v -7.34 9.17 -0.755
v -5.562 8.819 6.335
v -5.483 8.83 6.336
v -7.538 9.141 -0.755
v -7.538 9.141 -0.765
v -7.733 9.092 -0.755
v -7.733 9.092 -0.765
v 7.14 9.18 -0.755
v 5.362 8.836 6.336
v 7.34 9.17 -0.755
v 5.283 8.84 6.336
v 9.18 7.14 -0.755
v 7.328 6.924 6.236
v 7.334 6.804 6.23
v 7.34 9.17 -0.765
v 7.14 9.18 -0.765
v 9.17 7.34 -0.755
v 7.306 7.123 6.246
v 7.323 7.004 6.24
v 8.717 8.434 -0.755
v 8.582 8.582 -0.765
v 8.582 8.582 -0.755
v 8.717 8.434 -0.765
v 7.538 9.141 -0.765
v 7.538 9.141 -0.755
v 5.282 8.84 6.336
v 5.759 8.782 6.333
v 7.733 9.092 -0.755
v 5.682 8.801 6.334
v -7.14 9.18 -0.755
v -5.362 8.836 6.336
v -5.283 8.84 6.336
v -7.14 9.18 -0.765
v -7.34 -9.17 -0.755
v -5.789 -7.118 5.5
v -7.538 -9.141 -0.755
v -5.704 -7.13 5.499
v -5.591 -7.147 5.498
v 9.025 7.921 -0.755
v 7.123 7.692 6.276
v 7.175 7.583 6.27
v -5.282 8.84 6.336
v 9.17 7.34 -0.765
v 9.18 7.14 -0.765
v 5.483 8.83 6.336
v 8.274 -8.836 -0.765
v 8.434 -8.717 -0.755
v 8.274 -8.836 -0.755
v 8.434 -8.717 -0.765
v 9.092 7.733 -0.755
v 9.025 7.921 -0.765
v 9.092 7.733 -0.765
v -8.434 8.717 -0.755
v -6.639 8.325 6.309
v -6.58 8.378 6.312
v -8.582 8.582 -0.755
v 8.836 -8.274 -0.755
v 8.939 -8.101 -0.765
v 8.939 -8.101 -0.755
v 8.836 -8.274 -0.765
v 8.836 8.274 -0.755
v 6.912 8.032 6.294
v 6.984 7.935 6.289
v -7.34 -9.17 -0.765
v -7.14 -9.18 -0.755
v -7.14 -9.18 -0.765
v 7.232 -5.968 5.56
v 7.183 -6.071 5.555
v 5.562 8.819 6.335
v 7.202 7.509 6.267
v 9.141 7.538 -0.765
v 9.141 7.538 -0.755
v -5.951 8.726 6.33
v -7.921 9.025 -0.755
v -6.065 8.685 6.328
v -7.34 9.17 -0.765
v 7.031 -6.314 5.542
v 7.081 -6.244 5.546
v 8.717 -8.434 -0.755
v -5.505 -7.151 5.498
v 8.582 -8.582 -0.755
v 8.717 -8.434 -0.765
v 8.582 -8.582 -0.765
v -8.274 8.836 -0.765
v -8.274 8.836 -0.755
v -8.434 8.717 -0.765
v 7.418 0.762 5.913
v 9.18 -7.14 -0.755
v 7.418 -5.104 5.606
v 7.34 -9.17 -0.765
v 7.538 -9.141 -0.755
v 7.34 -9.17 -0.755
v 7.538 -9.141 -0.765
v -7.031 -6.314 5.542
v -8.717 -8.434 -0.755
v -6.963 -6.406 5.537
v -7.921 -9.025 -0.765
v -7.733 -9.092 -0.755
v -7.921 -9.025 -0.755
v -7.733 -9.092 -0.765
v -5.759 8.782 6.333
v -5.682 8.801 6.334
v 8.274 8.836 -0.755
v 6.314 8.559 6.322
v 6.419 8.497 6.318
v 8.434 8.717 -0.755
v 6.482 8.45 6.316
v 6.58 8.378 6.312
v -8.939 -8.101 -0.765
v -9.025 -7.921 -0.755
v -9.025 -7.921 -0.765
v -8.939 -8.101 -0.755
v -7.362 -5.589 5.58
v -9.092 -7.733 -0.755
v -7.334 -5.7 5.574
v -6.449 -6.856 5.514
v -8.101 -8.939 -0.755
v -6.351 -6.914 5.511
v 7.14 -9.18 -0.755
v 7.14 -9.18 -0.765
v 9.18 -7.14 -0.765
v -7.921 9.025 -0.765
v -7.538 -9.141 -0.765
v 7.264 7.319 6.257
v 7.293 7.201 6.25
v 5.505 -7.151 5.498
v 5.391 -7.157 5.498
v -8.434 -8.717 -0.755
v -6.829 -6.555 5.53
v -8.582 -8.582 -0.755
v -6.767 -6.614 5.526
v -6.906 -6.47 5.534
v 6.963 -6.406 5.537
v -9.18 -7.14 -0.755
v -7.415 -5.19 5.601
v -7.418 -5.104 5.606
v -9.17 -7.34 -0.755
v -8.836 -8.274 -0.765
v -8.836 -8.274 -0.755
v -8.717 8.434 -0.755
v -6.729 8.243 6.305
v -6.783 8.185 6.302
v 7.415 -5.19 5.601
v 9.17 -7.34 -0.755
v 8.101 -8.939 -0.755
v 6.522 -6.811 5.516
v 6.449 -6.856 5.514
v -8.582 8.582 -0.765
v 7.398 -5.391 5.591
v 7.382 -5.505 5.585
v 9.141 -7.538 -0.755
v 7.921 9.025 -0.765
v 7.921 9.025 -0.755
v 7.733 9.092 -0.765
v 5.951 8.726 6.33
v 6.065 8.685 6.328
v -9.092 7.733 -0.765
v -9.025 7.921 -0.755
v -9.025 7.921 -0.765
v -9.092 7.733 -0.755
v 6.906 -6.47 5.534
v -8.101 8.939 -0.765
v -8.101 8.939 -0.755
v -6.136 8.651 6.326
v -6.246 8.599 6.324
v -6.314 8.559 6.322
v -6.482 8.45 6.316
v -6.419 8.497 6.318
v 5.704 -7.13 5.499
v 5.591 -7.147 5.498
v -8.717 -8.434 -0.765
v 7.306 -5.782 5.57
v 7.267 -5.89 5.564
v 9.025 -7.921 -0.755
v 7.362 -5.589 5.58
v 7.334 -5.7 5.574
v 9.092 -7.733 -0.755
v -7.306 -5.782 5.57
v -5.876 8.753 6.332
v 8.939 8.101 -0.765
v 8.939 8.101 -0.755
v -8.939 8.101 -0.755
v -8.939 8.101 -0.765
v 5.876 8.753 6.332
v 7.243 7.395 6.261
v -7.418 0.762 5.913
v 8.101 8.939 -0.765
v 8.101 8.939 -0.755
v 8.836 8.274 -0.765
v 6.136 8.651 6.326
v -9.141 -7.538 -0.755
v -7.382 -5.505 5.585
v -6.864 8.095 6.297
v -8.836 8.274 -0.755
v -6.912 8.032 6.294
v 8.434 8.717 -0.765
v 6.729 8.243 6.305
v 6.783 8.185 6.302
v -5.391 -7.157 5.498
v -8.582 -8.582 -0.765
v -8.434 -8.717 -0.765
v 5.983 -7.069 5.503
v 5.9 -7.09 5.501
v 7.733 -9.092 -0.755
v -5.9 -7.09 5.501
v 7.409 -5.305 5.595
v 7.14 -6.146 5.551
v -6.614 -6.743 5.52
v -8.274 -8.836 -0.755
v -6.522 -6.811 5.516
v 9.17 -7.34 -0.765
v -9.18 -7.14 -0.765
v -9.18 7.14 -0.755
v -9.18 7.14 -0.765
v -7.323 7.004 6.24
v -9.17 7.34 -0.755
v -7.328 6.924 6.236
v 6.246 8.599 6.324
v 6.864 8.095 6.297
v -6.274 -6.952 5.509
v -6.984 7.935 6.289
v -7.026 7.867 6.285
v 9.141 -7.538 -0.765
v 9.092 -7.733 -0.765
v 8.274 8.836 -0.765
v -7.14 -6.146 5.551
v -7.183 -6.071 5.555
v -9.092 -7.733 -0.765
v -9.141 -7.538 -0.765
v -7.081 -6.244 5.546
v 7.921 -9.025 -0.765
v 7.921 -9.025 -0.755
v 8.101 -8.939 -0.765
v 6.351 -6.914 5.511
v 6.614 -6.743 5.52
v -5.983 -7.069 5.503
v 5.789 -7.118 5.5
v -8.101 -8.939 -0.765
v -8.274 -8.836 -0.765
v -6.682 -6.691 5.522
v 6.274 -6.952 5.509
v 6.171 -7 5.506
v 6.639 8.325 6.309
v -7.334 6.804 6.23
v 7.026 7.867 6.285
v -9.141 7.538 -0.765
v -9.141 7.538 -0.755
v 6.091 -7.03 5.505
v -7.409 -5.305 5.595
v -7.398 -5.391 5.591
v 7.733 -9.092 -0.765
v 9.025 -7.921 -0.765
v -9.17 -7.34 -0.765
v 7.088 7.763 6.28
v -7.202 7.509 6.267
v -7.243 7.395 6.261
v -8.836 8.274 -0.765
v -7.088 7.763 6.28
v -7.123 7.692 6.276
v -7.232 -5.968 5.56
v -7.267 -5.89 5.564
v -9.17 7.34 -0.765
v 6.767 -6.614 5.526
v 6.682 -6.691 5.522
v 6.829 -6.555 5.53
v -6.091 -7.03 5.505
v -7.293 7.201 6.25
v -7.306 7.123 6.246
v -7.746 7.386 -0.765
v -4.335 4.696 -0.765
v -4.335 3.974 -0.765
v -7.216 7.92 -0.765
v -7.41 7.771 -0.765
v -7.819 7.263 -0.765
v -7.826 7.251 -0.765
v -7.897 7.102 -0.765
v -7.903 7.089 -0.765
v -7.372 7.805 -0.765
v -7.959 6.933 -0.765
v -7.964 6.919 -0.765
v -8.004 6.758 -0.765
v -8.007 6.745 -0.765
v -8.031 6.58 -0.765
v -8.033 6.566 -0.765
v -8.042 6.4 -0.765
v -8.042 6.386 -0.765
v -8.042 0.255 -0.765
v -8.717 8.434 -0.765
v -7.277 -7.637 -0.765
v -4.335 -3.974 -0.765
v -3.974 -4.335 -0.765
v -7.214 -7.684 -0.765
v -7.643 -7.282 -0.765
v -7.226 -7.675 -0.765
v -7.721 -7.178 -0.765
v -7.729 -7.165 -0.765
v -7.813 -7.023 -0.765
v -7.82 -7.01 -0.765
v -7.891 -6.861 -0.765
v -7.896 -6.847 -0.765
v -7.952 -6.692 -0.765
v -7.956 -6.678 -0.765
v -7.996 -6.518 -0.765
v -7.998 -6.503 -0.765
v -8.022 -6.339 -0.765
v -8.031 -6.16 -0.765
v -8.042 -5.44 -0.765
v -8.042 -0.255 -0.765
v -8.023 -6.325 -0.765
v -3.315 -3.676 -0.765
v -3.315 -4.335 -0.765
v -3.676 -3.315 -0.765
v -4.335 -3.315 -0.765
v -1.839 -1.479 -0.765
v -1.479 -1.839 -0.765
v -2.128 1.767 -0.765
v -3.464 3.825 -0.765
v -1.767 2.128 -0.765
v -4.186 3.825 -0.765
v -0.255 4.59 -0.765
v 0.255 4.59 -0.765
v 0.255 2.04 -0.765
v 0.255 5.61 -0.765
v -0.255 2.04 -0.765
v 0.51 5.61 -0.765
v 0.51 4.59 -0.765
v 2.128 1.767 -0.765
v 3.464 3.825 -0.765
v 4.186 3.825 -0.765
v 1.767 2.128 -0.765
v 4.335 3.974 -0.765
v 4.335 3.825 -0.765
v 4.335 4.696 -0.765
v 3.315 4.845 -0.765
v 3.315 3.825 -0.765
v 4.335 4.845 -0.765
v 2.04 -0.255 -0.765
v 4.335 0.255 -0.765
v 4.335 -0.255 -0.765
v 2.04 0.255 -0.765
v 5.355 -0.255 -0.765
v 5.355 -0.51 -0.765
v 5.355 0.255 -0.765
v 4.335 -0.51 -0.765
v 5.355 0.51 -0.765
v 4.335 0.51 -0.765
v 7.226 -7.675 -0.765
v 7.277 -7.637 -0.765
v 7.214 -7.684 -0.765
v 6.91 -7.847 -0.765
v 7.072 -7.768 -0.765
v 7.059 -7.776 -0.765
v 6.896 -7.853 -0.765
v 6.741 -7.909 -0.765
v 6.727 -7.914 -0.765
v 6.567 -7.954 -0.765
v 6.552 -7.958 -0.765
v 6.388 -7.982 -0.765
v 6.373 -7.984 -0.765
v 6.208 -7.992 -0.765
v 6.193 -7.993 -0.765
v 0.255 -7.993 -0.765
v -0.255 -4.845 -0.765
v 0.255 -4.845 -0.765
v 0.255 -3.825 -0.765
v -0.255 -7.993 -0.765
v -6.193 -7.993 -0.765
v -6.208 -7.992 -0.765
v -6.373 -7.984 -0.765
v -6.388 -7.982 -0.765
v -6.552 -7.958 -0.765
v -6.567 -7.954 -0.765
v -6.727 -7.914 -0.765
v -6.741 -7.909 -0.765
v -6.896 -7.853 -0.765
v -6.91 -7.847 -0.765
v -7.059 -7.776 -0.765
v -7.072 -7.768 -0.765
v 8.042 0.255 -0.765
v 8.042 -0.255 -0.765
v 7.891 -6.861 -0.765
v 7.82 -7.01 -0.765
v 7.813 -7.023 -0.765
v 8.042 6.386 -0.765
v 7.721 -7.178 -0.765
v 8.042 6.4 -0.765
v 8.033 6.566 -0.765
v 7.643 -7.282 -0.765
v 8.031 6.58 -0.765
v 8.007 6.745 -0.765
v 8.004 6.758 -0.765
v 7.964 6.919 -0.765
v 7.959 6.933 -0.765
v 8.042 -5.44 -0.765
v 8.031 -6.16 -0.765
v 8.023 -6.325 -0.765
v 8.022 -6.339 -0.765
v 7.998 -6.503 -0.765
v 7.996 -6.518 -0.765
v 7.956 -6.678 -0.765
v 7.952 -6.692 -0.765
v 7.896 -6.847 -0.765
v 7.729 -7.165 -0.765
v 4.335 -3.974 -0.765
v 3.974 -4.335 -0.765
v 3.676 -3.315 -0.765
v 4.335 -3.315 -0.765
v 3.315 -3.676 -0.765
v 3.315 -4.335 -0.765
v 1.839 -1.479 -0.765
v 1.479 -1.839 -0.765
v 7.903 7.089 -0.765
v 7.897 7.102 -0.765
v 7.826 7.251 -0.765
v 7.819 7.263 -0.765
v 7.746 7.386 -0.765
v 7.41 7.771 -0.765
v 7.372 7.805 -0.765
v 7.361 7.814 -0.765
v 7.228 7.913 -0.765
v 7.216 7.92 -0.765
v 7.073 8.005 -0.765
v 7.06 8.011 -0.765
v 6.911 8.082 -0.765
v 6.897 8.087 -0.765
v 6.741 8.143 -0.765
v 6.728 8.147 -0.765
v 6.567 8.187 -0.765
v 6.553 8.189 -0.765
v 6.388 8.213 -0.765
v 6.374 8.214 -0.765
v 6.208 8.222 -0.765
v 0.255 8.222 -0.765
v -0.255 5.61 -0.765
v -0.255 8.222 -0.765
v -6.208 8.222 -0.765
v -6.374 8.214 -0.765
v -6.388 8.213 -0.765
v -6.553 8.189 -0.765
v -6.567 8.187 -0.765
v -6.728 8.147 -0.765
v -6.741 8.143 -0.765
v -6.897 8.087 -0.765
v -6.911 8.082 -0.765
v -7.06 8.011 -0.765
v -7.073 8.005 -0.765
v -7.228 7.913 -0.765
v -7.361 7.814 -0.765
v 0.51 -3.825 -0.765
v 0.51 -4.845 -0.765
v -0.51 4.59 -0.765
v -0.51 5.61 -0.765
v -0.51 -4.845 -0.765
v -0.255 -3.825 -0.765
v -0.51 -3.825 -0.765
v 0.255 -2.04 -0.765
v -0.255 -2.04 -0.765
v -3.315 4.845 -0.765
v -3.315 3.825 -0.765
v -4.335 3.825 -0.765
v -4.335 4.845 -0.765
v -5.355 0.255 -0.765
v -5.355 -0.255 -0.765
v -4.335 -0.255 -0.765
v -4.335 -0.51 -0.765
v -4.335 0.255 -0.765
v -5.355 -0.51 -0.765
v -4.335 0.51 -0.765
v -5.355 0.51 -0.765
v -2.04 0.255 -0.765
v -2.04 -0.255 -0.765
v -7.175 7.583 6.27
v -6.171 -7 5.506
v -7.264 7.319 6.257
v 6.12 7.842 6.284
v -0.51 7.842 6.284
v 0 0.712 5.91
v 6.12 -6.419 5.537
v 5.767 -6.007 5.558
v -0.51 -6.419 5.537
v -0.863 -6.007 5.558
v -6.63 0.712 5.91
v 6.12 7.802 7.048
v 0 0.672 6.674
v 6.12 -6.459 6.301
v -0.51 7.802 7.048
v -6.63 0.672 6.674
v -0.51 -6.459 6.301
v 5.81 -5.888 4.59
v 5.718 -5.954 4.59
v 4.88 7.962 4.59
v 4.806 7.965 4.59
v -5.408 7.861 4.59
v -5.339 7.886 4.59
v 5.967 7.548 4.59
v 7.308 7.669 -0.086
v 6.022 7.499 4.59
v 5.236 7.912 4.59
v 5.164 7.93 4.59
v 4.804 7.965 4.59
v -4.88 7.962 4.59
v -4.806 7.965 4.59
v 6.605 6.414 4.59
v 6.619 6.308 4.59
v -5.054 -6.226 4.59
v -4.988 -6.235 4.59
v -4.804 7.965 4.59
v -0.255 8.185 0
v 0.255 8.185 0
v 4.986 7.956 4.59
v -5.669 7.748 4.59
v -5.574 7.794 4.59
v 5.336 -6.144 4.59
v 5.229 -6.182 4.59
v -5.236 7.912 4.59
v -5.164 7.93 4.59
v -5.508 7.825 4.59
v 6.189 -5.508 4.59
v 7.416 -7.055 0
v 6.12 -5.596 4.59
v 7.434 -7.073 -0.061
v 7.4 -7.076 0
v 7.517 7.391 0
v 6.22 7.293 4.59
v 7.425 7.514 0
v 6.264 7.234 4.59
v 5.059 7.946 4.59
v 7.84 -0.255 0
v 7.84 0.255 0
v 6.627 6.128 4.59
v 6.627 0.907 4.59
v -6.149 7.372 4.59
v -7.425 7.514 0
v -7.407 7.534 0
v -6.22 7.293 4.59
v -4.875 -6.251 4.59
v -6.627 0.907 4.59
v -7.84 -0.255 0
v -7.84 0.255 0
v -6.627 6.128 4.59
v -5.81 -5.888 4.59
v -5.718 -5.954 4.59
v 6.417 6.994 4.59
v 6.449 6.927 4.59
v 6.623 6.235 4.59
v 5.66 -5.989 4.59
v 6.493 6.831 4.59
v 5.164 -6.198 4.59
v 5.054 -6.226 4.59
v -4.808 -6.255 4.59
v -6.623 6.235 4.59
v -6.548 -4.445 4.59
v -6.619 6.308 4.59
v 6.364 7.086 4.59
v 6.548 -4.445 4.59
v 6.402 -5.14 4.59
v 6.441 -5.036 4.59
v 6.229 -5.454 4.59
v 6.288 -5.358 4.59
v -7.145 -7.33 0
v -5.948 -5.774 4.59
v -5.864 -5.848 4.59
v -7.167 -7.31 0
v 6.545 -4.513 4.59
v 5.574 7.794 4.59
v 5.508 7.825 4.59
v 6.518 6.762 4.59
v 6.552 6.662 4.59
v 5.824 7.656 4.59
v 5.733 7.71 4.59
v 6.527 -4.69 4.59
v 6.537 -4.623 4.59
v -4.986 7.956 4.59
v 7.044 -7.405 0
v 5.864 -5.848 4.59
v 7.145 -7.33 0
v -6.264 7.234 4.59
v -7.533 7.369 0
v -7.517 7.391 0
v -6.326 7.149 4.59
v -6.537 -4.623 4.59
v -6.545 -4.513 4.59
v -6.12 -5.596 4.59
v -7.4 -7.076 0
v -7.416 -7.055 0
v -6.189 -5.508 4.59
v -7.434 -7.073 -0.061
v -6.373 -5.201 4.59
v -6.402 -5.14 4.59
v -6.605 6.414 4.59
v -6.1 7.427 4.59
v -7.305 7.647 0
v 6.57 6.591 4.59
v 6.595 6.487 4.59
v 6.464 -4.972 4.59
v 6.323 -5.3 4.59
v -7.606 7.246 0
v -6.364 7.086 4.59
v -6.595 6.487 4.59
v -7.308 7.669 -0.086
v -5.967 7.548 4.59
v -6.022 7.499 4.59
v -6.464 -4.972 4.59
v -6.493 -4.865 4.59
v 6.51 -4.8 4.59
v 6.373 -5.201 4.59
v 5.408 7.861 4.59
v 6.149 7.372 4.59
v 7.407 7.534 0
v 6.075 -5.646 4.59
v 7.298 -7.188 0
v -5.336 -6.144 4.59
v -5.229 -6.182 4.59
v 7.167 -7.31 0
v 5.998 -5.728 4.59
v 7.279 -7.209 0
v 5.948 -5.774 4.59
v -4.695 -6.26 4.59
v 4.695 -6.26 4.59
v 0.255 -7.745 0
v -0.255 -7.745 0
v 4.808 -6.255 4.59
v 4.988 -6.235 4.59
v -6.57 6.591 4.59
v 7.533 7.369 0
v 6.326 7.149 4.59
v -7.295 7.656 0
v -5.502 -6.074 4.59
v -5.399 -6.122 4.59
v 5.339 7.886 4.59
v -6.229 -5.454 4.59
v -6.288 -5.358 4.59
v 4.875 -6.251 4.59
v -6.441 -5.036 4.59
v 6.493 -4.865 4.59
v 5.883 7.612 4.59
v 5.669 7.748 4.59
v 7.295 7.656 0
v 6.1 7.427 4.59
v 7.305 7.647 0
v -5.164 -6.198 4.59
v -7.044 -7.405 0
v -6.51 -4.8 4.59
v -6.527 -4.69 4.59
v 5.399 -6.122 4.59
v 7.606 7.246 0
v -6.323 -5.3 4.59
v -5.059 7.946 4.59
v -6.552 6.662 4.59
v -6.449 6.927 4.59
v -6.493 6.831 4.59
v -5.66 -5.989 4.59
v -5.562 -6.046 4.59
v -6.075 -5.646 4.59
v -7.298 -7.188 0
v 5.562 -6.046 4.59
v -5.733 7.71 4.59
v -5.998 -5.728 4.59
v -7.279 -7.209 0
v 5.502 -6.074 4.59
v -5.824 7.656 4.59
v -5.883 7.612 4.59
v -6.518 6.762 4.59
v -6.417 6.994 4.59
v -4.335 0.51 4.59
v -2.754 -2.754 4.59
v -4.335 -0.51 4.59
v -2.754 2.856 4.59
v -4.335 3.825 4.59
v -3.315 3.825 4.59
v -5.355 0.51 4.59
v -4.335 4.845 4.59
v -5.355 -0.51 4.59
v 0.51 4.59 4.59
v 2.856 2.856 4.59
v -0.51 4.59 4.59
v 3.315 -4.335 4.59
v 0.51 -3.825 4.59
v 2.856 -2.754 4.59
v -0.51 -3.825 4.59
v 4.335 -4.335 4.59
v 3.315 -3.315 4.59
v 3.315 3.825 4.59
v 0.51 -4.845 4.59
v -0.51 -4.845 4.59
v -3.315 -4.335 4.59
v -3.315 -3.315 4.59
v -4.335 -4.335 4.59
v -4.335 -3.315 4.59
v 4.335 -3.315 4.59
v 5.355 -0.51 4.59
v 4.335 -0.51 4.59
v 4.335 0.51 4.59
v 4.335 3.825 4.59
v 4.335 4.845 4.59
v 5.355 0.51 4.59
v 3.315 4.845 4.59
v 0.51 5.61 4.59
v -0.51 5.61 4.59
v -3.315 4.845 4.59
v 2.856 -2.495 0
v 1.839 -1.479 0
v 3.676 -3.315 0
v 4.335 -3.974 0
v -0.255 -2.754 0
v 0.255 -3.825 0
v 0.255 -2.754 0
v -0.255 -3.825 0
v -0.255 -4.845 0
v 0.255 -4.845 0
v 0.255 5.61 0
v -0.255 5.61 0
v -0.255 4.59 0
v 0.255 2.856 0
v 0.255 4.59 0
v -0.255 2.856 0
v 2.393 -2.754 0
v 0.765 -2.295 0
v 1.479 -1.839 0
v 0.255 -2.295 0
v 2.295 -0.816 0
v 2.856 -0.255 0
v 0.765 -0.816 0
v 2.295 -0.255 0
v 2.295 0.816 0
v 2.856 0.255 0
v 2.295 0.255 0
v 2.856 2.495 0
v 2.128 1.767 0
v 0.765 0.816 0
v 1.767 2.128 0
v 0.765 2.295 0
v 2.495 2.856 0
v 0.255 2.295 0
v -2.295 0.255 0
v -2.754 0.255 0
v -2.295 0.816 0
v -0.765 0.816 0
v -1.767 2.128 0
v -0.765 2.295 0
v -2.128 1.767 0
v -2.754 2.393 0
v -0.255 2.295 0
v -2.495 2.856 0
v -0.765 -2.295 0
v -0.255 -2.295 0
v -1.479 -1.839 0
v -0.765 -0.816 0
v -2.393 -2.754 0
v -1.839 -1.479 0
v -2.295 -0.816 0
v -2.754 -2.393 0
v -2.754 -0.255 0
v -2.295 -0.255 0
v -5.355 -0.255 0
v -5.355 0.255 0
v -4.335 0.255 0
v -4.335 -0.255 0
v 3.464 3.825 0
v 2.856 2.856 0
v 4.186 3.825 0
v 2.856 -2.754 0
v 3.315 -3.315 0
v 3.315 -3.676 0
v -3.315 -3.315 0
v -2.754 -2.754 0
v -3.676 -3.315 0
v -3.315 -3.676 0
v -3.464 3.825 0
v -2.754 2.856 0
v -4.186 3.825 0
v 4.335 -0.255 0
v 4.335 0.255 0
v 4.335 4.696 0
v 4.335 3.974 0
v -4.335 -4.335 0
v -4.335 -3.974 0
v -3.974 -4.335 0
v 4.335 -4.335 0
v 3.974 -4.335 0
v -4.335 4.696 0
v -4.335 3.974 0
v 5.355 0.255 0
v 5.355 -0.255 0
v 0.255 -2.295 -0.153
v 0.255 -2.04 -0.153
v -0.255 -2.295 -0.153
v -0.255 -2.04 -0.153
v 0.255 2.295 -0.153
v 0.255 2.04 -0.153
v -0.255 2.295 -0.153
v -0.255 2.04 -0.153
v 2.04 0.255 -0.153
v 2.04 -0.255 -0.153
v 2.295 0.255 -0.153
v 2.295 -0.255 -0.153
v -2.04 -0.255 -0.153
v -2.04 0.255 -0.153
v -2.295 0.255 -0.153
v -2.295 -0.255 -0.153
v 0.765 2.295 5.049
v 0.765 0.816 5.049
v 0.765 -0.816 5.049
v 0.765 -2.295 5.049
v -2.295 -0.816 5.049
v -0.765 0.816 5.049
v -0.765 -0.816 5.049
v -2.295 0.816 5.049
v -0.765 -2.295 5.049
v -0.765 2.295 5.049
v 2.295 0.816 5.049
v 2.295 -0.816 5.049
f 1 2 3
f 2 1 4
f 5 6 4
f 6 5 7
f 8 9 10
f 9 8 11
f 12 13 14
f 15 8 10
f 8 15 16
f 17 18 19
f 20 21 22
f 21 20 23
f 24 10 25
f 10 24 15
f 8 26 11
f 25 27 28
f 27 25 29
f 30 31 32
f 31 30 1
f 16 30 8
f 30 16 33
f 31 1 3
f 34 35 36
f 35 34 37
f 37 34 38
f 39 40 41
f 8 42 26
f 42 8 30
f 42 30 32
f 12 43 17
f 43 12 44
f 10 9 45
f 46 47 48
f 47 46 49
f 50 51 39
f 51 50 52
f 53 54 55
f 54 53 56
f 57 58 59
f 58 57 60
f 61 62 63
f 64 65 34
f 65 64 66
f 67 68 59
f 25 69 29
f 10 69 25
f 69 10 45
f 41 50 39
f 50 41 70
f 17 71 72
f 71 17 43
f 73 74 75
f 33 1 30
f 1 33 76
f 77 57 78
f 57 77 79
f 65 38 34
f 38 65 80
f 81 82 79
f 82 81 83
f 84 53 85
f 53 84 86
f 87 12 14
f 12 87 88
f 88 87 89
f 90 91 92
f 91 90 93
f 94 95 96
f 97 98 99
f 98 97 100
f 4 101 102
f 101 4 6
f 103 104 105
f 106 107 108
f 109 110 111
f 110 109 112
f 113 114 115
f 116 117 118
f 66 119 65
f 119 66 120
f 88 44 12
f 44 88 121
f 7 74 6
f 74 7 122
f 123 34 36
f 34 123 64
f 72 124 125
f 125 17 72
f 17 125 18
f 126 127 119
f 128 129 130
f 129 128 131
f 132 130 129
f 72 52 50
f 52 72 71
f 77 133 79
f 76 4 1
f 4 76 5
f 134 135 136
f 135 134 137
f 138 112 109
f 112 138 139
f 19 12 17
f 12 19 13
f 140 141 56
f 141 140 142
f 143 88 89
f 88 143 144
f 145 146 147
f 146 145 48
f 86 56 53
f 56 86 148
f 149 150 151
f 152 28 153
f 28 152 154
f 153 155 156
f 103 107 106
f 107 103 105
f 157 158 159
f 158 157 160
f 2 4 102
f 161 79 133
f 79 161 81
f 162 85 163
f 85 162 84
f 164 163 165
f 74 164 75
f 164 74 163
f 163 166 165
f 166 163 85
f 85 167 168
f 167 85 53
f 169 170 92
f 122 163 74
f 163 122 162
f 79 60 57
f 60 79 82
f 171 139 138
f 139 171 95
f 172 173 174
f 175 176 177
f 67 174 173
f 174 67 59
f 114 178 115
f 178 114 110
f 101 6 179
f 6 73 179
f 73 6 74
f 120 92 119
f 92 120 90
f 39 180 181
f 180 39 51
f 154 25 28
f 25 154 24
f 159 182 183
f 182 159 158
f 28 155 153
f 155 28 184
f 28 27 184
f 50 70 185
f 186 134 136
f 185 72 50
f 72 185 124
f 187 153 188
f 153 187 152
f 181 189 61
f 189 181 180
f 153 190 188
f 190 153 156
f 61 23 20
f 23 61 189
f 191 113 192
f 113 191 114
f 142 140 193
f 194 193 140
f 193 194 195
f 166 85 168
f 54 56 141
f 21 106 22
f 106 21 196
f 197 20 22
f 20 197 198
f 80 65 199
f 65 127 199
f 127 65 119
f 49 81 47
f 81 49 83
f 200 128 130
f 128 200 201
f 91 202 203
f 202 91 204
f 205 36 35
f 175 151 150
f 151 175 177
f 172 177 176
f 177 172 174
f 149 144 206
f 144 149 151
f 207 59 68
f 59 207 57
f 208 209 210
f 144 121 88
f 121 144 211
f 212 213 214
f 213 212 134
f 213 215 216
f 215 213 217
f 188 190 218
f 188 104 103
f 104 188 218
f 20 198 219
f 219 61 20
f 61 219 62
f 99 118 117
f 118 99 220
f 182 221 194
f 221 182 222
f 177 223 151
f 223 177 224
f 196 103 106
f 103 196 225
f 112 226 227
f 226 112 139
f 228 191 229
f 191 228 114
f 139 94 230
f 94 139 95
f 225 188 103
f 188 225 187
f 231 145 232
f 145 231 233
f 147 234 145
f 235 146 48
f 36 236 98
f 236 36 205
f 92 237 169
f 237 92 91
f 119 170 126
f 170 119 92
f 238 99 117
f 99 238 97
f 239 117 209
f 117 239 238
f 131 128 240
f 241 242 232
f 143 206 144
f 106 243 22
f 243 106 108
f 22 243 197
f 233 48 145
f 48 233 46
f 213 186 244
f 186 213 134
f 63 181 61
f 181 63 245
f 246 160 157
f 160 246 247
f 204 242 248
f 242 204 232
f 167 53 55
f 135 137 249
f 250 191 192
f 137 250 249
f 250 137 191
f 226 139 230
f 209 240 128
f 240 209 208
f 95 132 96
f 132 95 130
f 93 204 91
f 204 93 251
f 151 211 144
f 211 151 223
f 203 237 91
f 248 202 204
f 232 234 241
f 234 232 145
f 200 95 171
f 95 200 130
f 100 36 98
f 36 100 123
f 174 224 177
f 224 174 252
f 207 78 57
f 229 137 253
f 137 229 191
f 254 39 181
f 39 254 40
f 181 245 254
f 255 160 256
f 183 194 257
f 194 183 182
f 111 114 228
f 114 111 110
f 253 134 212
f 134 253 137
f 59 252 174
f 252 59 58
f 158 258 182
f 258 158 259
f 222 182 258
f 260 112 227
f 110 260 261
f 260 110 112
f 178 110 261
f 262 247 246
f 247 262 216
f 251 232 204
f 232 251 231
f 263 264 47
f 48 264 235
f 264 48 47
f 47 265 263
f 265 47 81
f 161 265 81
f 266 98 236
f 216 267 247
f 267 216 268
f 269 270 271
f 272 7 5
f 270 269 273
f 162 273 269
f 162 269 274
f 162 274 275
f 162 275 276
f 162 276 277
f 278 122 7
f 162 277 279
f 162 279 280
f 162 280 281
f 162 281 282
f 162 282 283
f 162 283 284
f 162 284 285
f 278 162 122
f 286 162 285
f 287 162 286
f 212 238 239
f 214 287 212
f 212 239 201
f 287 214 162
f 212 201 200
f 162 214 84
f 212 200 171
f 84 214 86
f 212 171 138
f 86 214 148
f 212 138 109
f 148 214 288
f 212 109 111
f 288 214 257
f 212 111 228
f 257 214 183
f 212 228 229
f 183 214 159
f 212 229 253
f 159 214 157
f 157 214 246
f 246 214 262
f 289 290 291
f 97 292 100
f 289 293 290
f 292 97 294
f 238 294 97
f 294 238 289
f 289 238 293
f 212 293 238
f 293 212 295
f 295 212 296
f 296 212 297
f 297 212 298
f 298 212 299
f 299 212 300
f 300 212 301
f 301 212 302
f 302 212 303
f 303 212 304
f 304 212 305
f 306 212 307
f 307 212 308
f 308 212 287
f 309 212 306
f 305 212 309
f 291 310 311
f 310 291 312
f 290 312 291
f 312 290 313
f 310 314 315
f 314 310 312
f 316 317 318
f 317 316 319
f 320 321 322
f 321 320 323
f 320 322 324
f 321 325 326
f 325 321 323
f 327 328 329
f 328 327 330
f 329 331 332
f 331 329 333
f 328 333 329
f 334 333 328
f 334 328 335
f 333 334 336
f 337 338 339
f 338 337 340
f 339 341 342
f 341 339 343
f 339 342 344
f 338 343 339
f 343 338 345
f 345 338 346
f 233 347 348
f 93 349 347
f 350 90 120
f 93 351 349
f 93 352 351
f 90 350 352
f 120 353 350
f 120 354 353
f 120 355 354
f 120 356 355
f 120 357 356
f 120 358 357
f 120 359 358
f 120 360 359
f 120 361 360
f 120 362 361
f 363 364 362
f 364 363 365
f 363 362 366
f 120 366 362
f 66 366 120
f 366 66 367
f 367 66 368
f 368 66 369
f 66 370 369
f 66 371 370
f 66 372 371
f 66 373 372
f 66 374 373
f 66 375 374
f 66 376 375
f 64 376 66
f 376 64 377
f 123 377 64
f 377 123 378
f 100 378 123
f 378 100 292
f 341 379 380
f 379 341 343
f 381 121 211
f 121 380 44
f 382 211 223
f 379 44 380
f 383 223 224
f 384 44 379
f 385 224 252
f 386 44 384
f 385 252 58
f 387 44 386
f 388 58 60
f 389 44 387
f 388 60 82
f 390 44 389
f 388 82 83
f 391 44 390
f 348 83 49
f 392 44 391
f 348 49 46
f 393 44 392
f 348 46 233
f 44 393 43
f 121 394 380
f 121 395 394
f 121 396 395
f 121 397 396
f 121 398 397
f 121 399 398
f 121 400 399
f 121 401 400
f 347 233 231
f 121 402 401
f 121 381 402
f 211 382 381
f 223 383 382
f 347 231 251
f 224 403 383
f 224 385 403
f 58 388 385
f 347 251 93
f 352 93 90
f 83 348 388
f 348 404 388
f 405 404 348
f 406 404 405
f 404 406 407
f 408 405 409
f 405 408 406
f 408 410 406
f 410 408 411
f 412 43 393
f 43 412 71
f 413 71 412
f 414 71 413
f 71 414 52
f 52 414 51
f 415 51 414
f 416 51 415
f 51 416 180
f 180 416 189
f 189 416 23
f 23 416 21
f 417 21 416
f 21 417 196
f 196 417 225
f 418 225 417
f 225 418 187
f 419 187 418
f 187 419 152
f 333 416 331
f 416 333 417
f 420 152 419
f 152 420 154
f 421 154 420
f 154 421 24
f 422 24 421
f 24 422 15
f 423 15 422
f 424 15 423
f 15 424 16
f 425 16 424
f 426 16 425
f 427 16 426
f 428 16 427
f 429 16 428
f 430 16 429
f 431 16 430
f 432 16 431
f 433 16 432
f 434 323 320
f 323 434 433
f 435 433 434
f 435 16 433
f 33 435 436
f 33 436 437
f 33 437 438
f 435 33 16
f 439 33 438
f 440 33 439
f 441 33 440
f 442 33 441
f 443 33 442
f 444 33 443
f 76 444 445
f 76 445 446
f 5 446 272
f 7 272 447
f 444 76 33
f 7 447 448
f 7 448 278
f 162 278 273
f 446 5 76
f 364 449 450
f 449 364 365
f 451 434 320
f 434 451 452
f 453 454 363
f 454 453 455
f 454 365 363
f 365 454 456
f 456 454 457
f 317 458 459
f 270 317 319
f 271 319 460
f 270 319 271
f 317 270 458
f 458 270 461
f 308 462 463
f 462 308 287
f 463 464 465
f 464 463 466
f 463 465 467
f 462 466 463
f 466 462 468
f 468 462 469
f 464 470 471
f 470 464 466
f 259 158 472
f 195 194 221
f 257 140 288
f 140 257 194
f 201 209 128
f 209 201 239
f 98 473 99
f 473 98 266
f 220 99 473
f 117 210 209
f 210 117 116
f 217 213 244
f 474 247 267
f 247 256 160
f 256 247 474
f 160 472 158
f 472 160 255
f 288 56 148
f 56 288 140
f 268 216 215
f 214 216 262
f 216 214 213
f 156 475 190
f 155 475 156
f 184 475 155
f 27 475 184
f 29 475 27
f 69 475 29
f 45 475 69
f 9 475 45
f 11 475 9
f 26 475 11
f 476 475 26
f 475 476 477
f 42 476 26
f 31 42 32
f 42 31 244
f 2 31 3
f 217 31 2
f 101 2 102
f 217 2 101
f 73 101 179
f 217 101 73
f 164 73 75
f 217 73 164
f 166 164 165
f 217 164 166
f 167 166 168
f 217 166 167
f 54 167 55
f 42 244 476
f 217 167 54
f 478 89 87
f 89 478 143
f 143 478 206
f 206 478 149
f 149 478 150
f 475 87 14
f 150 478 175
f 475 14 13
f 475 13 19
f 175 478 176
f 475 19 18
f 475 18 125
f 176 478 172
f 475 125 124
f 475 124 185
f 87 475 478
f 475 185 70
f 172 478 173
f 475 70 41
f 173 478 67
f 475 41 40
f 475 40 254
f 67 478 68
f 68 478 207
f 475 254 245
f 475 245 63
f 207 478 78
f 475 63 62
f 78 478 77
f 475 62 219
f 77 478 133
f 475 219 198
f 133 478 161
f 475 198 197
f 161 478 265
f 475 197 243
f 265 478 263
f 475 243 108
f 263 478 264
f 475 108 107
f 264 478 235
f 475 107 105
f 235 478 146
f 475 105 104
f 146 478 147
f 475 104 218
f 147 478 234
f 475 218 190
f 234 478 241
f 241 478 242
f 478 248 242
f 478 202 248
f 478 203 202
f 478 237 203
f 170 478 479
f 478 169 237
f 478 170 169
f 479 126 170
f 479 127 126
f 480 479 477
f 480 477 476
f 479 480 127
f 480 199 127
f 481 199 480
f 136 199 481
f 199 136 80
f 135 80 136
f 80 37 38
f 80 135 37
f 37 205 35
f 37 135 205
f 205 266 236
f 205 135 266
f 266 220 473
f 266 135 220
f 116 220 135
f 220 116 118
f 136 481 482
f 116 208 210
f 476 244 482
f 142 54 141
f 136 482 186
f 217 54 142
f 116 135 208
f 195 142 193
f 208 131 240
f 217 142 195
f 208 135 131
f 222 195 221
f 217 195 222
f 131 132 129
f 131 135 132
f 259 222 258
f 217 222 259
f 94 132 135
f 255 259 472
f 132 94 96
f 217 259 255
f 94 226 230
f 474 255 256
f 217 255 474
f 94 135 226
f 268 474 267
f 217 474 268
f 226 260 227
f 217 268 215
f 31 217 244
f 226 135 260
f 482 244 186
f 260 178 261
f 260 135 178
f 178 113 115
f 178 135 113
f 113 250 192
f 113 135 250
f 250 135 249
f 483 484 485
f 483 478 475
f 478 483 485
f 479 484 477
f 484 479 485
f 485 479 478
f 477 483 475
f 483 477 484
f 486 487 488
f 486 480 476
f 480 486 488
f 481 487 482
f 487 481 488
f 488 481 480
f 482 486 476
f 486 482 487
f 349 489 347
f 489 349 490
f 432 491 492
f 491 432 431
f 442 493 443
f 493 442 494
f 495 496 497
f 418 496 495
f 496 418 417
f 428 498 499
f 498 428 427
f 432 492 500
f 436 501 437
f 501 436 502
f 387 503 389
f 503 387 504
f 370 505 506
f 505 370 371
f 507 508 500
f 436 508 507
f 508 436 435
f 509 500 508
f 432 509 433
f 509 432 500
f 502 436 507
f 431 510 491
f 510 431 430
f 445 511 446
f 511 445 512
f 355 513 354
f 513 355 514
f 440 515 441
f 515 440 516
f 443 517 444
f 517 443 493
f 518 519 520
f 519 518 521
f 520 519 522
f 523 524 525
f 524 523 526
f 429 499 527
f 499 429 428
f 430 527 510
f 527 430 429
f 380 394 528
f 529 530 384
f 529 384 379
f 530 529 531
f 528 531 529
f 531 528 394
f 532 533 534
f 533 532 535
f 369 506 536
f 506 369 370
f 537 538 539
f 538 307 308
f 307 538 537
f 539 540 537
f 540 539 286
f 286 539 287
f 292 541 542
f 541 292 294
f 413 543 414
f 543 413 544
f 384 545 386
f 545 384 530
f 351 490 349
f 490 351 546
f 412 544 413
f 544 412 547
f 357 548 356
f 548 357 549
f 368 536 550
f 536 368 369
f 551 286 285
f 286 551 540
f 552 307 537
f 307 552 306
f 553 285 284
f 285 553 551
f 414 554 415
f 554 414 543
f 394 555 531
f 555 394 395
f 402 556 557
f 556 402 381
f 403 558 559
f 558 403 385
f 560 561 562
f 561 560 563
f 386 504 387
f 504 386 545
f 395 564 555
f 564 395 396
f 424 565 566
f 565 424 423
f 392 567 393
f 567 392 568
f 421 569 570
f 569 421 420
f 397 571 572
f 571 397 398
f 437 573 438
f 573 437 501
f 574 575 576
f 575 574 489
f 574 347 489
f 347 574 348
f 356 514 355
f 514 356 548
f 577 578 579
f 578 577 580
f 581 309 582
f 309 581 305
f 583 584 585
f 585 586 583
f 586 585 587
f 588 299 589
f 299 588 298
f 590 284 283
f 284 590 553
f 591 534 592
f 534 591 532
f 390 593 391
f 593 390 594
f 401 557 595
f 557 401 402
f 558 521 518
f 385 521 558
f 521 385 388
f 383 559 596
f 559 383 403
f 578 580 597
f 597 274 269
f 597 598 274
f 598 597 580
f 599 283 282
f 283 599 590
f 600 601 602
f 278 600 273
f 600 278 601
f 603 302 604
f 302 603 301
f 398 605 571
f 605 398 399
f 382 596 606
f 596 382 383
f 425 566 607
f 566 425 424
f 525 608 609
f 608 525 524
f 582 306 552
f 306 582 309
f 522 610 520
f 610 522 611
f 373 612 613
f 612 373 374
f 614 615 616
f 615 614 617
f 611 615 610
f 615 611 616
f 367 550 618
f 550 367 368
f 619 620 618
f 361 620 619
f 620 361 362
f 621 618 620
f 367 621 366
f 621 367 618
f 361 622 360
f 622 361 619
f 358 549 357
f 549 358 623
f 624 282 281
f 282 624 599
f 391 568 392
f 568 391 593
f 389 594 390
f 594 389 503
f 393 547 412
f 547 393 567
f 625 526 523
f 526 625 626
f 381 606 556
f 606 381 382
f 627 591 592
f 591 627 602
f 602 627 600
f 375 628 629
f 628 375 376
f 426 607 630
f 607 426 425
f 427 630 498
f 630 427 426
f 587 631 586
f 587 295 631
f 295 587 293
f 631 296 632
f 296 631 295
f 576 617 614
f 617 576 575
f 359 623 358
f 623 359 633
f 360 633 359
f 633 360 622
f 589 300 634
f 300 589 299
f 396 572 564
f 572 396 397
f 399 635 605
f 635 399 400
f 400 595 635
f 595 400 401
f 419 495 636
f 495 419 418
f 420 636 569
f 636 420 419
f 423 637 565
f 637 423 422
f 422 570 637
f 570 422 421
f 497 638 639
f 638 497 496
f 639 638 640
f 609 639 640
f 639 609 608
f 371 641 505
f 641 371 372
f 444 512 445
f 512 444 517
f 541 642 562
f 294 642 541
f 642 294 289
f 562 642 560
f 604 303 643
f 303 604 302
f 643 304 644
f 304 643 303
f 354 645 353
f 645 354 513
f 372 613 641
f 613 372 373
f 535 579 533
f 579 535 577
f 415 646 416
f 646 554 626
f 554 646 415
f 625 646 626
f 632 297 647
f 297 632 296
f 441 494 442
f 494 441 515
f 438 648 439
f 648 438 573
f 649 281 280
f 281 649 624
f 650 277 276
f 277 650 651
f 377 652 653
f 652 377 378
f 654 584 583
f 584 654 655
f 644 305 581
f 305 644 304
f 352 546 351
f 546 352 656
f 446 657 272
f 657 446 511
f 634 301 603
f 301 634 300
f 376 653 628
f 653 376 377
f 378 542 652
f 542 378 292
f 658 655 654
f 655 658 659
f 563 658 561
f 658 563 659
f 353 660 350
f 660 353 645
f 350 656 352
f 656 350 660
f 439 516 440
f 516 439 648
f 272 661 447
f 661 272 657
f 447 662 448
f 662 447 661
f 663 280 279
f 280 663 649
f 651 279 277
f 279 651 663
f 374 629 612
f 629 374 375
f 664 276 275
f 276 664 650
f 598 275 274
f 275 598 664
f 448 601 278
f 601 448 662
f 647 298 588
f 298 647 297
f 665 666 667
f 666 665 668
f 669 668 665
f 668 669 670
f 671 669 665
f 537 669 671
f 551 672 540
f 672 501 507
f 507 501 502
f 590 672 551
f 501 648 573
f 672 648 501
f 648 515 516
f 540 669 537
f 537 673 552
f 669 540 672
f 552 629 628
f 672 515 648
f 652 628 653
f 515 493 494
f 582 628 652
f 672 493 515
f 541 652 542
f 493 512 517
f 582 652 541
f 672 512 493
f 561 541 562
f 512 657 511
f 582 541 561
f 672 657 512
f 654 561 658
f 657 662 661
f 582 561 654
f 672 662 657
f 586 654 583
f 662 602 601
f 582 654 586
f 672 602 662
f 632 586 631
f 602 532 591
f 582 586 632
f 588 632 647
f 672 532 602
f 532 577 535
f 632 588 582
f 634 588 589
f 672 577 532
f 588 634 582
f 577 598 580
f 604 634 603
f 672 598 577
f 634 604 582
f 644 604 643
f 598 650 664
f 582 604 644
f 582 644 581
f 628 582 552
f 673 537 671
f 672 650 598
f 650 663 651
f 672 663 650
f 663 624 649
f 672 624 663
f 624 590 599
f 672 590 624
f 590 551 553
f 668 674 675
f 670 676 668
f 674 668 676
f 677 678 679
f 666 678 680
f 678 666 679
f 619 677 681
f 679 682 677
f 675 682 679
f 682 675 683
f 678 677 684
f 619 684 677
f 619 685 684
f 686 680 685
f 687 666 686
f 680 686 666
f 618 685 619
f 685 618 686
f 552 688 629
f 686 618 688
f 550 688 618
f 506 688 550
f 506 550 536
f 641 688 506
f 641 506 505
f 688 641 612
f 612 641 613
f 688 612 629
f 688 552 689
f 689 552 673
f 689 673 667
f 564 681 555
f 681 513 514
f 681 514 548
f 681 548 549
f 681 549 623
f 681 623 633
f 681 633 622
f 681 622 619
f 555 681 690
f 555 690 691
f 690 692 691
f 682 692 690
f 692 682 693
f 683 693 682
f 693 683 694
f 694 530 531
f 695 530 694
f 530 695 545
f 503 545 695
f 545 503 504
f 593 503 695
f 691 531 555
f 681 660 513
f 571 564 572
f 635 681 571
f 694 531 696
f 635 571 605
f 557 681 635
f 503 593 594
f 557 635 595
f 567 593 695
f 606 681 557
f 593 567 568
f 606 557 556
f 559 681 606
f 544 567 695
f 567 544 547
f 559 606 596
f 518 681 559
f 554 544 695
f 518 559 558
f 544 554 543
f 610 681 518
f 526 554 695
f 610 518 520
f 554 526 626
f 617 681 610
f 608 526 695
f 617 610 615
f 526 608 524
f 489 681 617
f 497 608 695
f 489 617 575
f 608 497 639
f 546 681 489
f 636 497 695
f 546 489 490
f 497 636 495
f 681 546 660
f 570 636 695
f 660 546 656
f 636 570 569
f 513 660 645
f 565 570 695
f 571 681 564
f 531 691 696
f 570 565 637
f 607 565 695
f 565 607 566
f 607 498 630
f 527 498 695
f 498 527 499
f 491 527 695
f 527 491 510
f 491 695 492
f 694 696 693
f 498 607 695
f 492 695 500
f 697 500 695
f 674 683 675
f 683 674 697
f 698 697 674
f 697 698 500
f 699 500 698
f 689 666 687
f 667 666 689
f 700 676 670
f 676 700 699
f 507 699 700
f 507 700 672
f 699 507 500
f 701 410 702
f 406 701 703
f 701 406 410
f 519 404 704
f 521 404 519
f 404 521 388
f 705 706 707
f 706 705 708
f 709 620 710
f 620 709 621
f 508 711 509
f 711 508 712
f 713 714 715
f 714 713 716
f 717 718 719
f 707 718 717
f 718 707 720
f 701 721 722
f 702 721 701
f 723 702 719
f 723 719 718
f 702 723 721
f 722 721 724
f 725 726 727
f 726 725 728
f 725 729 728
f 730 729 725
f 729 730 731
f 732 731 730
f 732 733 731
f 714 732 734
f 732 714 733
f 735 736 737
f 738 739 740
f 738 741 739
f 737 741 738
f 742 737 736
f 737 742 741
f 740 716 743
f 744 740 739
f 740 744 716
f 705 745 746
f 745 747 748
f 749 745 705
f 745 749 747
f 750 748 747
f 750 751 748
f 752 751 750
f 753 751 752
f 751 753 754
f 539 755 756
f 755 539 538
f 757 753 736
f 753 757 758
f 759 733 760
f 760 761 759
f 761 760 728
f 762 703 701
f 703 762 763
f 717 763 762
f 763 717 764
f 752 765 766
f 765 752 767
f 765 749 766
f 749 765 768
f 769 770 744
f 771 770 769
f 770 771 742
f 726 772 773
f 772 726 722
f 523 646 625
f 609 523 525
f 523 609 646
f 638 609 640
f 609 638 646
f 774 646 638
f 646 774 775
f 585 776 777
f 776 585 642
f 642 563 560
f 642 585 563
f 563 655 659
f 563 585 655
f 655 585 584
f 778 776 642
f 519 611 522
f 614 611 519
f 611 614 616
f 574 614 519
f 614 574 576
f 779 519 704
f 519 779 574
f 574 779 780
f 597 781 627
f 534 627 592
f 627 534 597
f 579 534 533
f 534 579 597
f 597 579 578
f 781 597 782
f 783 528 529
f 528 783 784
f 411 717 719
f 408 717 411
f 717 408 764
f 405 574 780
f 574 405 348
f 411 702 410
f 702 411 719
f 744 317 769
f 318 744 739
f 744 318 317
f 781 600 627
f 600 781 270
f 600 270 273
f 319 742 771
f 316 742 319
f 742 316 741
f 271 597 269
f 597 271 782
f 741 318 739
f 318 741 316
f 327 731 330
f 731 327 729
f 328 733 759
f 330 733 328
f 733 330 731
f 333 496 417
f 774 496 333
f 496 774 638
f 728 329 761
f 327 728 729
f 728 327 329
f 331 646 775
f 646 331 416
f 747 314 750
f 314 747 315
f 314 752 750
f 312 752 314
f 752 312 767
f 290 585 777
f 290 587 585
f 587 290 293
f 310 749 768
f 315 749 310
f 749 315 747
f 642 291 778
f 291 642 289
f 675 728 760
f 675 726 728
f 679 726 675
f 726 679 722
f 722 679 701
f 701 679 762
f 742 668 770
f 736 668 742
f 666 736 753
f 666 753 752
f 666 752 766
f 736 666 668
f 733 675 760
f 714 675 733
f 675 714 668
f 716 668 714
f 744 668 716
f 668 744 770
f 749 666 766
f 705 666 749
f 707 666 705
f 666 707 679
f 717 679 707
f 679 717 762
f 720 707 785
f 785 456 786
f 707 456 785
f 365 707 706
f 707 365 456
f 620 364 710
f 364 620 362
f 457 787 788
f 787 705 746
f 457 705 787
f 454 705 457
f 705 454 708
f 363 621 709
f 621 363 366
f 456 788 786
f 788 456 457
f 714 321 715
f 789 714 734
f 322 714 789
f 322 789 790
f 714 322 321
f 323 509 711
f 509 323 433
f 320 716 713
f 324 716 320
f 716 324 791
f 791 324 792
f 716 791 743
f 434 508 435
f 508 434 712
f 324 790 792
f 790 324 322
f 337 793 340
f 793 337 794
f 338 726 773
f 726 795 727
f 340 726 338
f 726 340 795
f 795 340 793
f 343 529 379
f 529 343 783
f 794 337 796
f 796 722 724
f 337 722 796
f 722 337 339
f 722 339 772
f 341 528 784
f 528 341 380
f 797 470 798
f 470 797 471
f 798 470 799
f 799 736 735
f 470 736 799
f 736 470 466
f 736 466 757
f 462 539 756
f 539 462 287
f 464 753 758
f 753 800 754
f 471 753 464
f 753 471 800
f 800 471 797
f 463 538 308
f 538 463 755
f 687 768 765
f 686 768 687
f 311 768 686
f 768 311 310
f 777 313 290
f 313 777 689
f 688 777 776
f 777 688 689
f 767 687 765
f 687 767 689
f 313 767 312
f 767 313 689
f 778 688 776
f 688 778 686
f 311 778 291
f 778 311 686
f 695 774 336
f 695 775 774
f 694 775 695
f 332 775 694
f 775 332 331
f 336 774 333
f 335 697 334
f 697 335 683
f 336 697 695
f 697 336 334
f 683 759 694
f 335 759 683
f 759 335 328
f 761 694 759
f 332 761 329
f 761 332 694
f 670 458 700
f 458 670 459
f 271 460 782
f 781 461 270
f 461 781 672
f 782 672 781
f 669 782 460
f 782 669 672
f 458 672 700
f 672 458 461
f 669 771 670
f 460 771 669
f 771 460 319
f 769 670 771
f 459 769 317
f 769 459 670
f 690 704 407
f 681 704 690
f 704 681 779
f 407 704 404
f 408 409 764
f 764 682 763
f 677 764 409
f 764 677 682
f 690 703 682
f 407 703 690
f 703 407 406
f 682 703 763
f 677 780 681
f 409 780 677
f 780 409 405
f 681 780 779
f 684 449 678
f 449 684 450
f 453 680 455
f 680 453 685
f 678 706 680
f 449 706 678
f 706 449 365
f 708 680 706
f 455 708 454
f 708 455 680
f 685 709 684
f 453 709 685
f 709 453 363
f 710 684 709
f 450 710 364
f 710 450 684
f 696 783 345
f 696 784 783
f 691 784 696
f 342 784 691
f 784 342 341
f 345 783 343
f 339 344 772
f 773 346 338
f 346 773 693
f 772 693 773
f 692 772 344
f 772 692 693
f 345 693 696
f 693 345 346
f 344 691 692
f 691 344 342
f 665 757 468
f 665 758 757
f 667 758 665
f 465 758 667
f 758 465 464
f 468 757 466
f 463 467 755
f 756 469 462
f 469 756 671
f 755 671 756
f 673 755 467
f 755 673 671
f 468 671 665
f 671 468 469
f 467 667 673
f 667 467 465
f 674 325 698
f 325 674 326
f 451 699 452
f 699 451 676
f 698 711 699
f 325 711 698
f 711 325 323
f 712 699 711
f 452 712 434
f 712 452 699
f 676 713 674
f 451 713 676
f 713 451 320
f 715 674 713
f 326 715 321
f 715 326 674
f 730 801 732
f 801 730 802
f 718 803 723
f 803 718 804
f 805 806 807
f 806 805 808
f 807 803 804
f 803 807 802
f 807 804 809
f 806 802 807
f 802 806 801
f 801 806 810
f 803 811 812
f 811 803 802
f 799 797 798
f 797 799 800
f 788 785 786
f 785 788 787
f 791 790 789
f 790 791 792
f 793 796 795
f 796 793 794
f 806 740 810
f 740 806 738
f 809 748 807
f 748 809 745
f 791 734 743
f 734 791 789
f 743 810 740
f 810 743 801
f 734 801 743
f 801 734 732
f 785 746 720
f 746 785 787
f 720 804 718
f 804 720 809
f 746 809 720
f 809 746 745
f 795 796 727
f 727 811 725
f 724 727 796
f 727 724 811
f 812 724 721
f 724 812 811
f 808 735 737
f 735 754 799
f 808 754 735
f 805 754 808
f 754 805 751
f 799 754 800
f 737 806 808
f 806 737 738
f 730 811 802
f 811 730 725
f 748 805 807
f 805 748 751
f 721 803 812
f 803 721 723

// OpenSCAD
// Row 4 decorated Cherry MX key

// dimensions Cherry MX connector
c_corr = .5;                // tolerance
c_horiz = 1.1;              // horizontal bar width
c_vert = 1.0;               // vertical bar width
c_dia = 4;                  // cross width
c_depth = 5;                // connector depth
c_space = 4;                // height of hollow inside
c_inset = 0.75;              // distance connector start to keycap base

// decoration
obj = "emerald.stl";          // decoration object
obj_pos = [0,0.7,2.5];        // decoration offset
factor_em = 1.1;
obj_scale = [0.8*factor_em,1.1*factor_em,1.1*factor_em]; // decoration scale
obj_rot = [3,0,0];          // decoration rotation

// keycap shape
head_tilt = 3;              // rotation of top around x-axis
head_pos = 2.25;            // keycap top y-offset
head_height = 11;           // z-offset of keycap top from the bottom of the keycap
cutoff = 6.5;               // cut keycap here to make room for decoration
                            // must be bigger than c_space + c_corr
key_scale = [1.02,1.02,1.02]; // overall scale

// stuff
$fn = 64;

//triangle
b = 10;
h = 10;
w = 13;

// create basic key shape from dxf frames for base and top
module shape()
{
    hull()
    {
        translate([0,0,-c_inset]) linear_extrude(height=.01) import("base.dxf");
        rotate([head_tilt,0,0]) translate([0,6.75+head_pos,head_height-c_inset]) linear_extrude(height=.01) import("top.dxf");
    }
}

// construct the connector pin
module connector() 
{
    translate([0,0,c_depth/2-.1]) union()
    {
        cube([c_vert+c_corr,c_dia+c_corr,c_depth+.1], center=true );
        cube([c_dia+c_corr,c_horiz+c_corr,c_depth+.1], center=true );
    }
}

// create the hollow key with decoration
module key()
{
    difference()
    {
        // combine basic key shape with decoration
        union()
        {
            //translate(obj_pos) rotate(obj_rot) scale(obj_scale) import(obj);               
				rotate([-head_tilt,180,0]) translate([-1,0,0]) linear_extrude(height = w, center = true, convexity = 10, twist = 0					)
				polygon(points=[[-5,-6],[1,1],[-5,8]], paths=[[0,1,2]]);
				rotate([-head_tilt,180,0]) translate([5.5,0,0]) linear_extrude(height = w, center = true, convexity = 10, twist = 0					)
				polygon(points=[[-5,-6],[1,1],[-5,8]], paths=[[0,1,2]]);
				// end design
            difference()
            {
                shape();
                rotate([head_tilt,0,0]) translate([0,0,5+cutoff-c_inset]) cube([100,100,10], center=true);
            }
        }

        // subtract scaled basic shape, cut at minimum required height
        difference()
        {
            scale([.9,.9,.9]) translate([0,0,-1]) shape();
            translate([0,0,5+c_space+c_corr]) cube([100,100,10], center=true);
        }
    }
}

// combine key, pin and connector. cleanup below the key
scale(key_scale) difference()
{
    union() 
    { 
        key();

			translate([-2.7,-2.7,0]) cube(size = [(c_dia+1+c_corr),(c_dia+1+c_corr),c_space+c_corr], center = false);
			//RTS support structure
			//connector
			rotate([0,0,45])
			{
				translate([-0.25,-11.3,-0.75]) cube([0.5,9,0.75], center=false);
				translate([-0.25,2.7,-0.75])  cube([0.5,8.5,0.75], center=false);
				translate([2.7,-0.25,-0.75])  cube([8.5,0.5,0.75], center=false);
				translate([-11.3,-0.25,-0.75]) cube([9,0.5,0.75], center=false);
			}
			translate([-0.25,-8.5,-0.75]) cube([0.5,6.5,0.75], center=false);
			translate([-0.25,2,-0.75])  cube([0.5,6.5,0.75], center=false);
			translate([2,-0.25,-0.75])  cube([6.5,0.5,0.75], center=false);
			translate([-8.5,-0.25,-0.75]) cube([6.5,0.5,0.75], center=false);		
			//roof
			translate([-4.25,-4.25,-0.75]) cube([1,1,6], center=false);		
			translate([3.25,3.75,-0.75])   cube([1,1,6], center=false);		
			translate([-4.25,3.75,-0.75])  cube([1,1,6], center=false);		
			translate([3.25,-4.25,-0.75])  cube([1,1,6], center=false);		
			
			translate([-0.5,-4.75,-0.75]) cube([1,1,6], center=false);		
			translate([4.25,-0.5,-0.75])   cube([1,1,6], center=false);		
			translate([-5.25,-0.5,-0.75])  cube([1,1,6], center=false);		
			translate([-0.5,4.5,-0.75])  cube([1,1,6], center=false);		
			
			//END RTS support structure 
	}
    
	connector();	

	translate([0,0,-50-c_inset]) cube([100,100,100], center=true);

}
